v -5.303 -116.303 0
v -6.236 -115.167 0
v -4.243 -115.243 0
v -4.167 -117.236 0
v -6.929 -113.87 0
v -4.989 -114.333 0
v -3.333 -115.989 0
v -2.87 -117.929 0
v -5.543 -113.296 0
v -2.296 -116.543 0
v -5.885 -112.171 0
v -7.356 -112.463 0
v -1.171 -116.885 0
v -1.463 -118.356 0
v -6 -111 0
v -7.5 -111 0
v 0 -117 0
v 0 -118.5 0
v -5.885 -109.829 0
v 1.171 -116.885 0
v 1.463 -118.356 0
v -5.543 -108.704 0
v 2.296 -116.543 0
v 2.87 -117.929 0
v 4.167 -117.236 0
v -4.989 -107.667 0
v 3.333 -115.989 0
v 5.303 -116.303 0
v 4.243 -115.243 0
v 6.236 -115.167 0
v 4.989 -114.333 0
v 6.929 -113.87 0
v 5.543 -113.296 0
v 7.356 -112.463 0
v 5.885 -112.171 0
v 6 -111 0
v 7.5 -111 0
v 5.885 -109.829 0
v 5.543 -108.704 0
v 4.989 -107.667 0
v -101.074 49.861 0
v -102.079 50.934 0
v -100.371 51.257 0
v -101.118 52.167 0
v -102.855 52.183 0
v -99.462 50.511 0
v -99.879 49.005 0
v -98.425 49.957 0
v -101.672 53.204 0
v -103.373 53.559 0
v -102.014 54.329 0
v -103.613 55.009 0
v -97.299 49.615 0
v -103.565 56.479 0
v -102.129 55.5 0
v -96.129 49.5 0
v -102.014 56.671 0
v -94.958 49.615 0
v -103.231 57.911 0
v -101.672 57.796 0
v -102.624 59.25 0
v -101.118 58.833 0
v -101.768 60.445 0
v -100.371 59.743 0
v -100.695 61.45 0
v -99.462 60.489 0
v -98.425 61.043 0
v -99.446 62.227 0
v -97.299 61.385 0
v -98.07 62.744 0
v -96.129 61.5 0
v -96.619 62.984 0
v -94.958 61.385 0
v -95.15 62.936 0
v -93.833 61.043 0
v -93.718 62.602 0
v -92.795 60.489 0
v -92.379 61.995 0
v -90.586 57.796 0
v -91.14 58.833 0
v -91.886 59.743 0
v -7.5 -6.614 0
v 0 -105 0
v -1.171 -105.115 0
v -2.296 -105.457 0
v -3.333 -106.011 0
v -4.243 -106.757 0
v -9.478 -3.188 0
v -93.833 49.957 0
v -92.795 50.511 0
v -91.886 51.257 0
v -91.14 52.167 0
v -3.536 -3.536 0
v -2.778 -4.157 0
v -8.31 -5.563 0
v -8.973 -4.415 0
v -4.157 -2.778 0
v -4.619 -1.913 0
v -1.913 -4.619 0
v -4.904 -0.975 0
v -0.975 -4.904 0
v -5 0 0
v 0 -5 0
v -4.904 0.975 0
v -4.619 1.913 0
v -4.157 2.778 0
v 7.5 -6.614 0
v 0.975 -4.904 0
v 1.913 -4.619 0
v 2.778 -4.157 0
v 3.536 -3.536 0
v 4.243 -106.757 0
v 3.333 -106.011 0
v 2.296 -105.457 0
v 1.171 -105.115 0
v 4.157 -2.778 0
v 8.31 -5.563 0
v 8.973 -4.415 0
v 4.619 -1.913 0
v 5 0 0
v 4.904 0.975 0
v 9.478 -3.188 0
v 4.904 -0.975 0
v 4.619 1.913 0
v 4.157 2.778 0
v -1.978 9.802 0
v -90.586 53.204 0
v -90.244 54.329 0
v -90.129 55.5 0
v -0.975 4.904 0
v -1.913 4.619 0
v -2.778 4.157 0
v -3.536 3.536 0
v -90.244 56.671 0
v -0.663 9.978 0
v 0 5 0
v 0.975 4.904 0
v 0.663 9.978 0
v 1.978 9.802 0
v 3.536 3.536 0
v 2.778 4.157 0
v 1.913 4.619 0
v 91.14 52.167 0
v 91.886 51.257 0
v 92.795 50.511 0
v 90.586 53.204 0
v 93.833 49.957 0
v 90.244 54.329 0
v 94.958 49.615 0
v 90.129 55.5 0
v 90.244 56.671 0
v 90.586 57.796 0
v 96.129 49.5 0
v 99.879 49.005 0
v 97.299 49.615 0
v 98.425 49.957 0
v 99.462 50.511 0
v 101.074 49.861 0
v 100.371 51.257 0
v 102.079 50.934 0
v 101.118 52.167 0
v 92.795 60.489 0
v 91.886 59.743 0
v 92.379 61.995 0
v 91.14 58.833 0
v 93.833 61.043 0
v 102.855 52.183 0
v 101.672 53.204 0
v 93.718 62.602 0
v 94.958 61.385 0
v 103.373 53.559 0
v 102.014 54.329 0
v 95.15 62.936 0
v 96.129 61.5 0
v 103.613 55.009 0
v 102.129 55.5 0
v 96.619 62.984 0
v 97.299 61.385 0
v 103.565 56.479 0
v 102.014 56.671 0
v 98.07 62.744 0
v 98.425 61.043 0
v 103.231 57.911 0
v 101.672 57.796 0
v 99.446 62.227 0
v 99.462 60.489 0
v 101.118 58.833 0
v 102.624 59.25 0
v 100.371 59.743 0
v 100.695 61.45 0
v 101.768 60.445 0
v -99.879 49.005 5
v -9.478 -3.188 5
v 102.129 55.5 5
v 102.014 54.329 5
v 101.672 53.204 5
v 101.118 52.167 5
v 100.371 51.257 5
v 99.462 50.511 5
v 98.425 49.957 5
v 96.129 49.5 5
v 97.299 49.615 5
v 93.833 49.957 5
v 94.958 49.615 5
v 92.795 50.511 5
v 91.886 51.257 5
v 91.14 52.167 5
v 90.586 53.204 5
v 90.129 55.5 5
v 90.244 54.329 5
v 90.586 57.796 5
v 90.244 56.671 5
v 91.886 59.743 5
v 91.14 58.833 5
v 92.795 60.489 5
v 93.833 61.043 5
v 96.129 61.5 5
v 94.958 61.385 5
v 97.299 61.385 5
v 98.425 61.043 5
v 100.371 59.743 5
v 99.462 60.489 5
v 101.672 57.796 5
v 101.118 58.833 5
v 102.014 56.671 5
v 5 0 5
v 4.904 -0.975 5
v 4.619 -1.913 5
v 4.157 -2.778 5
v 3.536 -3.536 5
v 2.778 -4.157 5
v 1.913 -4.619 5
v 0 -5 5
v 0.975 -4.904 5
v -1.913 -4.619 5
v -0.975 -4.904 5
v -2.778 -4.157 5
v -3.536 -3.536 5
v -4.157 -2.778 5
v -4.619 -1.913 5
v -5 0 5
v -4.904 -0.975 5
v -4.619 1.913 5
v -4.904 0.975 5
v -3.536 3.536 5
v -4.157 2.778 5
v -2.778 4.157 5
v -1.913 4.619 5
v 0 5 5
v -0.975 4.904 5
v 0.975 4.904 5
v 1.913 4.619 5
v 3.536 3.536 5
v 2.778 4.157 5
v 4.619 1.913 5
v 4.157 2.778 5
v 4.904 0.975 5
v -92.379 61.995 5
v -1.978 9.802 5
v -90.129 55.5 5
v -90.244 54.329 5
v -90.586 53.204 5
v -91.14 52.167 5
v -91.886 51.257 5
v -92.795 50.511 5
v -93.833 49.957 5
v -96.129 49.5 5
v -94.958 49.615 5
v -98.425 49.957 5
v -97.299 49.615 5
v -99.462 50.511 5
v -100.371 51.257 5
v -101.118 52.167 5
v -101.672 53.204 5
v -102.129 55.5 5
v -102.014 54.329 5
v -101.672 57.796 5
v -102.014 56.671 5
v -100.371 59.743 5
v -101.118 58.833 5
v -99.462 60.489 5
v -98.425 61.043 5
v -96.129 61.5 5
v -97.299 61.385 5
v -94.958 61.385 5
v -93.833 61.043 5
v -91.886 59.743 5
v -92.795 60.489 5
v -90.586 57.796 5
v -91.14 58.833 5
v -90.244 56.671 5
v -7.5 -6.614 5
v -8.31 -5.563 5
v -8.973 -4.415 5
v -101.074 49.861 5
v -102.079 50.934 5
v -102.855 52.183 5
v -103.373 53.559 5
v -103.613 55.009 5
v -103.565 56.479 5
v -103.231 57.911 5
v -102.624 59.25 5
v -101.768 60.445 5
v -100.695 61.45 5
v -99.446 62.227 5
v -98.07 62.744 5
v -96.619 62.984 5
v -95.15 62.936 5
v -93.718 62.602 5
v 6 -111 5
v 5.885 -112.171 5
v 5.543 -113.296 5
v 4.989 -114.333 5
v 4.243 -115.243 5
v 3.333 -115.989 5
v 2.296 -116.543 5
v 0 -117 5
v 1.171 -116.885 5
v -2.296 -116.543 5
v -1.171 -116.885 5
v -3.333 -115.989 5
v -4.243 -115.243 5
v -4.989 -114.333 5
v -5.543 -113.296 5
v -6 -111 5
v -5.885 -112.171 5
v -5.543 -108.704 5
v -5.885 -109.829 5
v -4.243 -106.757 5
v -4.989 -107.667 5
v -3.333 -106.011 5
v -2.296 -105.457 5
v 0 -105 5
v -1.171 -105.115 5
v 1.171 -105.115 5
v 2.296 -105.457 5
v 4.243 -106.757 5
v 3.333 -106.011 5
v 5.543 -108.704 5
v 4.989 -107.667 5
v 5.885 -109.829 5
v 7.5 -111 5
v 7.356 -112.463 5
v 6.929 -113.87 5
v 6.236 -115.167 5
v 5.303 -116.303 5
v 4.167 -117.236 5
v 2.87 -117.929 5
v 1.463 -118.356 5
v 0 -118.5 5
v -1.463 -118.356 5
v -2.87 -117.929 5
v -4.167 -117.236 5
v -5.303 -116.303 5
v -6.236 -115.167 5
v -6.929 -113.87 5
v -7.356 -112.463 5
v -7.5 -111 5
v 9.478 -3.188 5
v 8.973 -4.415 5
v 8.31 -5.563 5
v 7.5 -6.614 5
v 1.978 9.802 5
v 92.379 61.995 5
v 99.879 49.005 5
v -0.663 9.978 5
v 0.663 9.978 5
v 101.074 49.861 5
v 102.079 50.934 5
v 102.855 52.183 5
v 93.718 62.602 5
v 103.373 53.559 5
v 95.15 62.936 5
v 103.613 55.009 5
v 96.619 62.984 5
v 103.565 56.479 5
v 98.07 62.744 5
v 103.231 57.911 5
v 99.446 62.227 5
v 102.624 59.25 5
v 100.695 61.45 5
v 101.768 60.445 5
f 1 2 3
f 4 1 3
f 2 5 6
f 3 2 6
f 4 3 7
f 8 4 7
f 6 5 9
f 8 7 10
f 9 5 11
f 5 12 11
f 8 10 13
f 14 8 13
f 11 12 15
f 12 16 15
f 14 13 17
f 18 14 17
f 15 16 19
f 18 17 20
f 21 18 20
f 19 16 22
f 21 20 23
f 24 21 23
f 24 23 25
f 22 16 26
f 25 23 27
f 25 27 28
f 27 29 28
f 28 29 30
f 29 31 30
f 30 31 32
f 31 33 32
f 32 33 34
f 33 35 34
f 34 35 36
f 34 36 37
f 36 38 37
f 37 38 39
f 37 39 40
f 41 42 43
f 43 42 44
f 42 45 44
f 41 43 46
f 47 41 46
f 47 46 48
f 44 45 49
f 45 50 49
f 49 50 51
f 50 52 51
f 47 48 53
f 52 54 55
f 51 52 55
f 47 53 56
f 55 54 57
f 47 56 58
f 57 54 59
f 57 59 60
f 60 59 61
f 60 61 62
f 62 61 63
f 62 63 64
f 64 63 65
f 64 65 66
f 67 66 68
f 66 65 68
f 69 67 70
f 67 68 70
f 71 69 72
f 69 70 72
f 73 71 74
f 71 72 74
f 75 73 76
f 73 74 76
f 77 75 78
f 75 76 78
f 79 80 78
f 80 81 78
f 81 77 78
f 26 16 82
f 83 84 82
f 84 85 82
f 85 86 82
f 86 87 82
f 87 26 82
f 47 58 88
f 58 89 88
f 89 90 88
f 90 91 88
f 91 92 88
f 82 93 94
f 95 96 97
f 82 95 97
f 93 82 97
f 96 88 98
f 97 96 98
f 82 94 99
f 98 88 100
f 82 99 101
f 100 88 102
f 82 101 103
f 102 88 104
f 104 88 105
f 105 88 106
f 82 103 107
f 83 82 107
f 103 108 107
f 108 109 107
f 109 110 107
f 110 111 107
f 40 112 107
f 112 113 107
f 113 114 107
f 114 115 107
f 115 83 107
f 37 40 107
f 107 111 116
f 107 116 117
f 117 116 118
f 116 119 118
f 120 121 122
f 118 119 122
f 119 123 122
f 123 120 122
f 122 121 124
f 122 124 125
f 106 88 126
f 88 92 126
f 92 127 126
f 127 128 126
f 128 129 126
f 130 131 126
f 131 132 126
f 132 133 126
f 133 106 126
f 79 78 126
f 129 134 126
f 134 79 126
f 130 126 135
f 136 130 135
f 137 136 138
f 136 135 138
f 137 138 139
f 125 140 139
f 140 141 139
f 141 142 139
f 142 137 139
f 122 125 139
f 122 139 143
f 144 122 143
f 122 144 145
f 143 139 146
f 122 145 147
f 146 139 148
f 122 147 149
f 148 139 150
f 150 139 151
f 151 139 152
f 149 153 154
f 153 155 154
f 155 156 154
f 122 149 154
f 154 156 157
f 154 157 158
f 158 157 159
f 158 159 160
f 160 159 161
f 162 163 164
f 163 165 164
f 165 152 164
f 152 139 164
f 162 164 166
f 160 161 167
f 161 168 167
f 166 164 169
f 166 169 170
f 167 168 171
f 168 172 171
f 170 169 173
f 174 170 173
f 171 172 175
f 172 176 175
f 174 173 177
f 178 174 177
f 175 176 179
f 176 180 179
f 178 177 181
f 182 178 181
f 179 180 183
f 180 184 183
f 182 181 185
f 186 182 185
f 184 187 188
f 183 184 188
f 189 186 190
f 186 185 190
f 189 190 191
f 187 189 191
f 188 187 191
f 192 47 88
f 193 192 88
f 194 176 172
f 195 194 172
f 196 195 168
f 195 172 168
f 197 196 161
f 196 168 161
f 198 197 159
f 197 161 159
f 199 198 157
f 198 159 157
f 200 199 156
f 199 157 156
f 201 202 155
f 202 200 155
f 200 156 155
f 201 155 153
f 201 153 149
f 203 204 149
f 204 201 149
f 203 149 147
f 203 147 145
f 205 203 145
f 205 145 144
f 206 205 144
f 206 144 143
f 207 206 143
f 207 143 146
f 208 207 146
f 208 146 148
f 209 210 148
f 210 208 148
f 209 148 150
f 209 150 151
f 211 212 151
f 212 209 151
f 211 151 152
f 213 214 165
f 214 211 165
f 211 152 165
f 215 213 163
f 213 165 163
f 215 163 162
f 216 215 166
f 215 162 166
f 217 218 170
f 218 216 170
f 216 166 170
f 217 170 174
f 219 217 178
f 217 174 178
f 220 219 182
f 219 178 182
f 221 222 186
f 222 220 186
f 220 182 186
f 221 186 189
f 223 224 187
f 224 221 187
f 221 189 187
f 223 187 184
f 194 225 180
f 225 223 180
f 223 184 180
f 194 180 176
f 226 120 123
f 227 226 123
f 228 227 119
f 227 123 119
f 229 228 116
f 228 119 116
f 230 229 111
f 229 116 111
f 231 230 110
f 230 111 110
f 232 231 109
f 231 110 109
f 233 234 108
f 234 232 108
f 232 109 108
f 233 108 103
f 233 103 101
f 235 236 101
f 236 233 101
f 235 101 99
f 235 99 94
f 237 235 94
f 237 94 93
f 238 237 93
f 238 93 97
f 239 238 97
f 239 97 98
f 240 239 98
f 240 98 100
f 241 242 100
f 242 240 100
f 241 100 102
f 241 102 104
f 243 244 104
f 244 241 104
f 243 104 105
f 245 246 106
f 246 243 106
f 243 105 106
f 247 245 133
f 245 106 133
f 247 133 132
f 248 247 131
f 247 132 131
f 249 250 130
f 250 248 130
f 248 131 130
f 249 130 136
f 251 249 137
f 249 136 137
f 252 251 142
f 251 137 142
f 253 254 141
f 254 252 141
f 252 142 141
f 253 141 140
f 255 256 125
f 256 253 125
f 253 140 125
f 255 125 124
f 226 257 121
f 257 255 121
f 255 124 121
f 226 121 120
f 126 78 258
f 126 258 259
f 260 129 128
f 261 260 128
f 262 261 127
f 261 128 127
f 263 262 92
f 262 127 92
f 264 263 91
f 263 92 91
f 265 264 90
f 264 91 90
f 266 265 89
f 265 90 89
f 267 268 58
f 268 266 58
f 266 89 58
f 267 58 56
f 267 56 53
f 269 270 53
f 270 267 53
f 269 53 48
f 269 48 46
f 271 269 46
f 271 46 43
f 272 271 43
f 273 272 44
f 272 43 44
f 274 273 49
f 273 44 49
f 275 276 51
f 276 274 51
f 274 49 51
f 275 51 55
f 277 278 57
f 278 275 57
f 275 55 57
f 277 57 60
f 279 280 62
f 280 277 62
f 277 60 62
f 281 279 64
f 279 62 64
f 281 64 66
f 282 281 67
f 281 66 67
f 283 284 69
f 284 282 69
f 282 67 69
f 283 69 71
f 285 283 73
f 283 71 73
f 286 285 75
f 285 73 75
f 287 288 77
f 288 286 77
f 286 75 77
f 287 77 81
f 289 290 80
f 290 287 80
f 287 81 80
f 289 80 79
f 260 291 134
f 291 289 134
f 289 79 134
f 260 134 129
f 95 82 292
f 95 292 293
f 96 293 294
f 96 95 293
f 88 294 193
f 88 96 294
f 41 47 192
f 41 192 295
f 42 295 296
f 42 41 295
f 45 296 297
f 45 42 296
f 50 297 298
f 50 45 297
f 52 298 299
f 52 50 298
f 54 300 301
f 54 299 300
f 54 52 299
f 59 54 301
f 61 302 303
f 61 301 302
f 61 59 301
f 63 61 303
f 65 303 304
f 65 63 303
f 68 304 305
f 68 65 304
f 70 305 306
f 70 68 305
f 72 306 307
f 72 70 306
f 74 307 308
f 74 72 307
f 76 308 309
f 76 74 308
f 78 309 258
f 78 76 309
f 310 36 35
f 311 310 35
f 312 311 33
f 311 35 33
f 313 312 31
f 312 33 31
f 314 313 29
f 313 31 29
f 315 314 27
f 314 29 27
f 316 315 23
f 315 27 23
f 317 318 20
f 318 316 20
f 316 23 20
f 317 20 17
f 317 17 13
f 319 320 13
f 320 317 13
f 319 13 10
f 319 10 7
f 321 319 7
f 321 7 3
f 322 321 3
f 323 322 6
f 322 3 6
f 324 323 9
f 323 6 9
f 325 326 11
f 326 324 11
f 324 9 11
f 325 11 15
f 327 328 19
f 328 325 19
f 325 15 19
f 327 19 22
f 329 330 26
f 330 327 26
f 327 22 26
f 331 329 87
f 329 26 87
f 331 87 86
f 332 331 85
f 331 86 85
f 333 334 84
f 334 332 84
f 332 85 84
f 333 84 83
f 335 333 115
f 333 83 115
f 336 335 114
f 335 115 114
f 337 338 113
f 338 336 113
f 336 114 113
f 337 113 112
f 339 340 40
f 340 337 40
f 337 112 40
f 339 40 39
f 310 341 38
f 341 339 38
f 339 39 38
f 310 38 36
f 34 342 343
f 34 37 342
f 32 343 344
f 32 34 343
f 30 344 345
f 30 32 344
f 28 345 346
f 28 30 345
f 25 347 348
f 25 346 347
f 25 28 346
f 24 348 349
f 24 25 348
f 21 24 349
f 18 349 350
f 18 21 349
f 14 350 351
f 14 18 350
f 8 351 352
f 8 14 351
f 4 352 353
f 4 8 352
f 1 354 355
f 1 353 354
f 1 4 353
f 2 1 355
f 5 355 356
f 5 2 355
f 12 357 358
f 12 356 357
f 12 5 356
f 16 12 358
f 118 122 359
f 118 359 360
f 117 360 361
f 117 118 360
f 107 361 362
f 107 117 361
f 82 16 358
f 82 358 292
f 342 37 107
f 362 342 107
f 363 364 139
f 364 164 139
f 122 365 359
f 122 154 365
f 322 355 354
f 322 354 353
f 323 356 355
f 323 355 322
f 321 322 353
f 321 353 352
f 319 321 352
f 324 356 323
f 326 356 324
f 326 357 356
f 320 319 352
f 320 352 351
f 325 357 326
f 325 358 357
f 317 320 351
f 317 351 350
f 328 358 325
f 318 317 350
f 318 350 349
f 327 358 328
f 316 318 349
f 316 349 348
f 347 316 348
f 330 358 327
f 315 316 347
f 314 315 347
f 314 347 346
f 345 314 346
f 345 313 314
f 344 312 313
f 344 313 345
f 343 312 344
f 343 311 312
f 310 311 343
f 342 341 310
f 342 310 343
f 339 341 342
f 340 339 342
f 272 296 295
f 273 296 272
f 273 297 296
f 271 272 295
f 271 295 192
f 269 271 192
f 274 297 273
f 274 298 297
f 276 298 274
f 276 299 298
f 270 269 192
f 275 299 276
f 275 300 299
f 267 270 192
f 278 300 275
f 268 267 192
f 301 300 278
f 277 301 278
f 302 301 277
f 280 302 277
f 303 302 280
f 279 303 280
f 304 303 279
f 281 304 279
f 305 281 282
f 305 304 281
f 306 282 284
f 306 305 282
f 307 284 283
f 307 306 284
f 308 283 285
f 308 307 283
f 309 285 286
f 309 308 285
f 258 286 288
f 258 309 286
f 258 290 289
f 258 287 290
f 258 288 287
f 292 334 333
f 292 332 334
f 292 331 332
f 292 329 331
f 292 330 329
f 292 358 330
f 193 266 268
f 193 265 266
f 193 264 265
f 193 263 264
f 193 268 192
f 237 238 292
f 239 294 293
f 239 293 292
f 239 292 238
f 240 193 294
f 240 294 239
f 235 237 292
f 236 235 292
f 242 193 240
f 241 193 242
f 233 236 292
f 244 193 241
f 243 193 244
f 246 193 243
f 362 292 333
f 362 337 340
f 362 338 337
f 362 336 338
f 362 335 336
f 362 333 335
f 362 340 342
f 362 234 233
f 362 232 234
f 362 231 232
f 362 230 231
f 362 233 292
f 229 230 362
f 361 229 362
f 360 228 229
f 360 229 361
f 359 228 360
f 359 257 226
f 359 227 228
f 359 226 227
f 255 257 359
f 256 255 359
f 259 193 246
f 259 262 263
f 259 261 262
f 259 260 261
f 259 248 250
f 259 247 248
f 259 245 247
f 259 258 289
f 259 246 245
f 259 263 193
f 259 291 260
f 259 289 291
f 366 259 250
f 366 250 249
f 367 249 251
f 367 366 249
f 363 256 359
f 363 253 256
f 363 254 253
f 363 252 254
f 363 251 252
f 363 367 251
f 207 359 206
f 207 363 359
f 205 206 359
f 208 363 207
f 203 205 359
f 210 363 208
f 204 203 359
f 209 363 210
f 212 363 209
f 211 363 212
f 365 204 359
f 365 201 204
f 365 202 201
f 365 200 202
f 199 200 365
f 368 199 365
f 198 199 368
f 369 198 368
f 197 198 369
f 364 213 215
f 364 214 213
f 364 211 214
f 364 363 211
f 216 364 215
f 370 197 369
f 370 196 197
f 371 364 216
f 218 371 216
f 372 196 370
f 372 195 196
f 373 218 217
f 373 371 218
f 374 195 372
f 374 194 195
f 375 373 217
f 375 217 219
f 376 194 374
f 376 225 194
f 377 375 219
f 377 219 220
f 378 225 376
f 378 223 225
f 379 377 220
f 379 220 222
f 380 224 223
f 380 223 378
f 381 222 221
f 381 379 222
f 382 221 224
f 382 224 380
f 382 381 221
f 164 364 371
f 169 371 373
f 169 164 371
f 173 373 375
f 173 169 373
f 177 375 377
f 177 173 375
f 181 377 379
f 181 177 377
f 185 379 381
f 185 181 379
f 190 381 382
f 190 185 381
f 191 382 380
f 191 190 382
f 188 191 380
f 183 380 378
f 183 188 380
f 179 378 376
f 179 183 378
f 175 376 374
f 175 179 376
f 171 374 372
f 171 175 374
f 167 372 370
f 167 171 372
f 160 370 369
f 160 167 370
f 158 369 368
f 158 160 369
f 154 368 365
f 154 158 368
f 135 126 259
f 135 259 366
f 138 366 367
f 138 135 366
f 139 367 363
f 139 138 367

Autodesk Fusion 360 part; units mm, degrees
sketch "Sketch1" plane through (0, 0, 0) normal (0, 0, 1) x (1, 0, 0) in component "Spectroscope Feet"
  circle A0 centre (96.1288, 55.5) radius 6
  circle A1 centre (-96.1288, 55.5) radius 6
  circle A2 centre (0, -111) radius 6
  circle A3 centre (0, -111) radius 7.5
  circle A4 centre (-96.1288, 55.5) radius 7.5
  circle A5 centre (96.1288, 55.5) radius 7.5
  circle A6 centre (0, 0) radius 10
  line L0 (92.3788, 61.9952) -> (1.9782, 9.8024)
  line L1 (99.8788, 49.0048) -> (9.4782, -3.188)
  line L2 (-99.8788, 49.0048) -> (-9.4782, -3.188)
  line L3 (-92.3788, 61.9952) -> (-1.9782, 9.8024)
  line L4 (-7.5, -111) -> (-7.5, -6.6144)
  line L5 (7.5, -111) -> (7.5, -6.6144)
  circle A7 centre (0, 0) radius 5
  dimension "d4" = 12
  dimension "d5" = 12
  dimension "d6" = 12
  dimension "d7" = 15
  dimension "d8" = 15
  dimension "d9" = 15
  dimension "d10" = 20
  dimension "d11" = 10
extrude "Extrude1" add sketch "Sketch1" along normal blind 5 in component "Spectroscope Feet"
component "Spectroscope Feet" placed x (1, 0, 0) y (0, 1, 0) z (0, 0, 1) at (0, 0, 0)
